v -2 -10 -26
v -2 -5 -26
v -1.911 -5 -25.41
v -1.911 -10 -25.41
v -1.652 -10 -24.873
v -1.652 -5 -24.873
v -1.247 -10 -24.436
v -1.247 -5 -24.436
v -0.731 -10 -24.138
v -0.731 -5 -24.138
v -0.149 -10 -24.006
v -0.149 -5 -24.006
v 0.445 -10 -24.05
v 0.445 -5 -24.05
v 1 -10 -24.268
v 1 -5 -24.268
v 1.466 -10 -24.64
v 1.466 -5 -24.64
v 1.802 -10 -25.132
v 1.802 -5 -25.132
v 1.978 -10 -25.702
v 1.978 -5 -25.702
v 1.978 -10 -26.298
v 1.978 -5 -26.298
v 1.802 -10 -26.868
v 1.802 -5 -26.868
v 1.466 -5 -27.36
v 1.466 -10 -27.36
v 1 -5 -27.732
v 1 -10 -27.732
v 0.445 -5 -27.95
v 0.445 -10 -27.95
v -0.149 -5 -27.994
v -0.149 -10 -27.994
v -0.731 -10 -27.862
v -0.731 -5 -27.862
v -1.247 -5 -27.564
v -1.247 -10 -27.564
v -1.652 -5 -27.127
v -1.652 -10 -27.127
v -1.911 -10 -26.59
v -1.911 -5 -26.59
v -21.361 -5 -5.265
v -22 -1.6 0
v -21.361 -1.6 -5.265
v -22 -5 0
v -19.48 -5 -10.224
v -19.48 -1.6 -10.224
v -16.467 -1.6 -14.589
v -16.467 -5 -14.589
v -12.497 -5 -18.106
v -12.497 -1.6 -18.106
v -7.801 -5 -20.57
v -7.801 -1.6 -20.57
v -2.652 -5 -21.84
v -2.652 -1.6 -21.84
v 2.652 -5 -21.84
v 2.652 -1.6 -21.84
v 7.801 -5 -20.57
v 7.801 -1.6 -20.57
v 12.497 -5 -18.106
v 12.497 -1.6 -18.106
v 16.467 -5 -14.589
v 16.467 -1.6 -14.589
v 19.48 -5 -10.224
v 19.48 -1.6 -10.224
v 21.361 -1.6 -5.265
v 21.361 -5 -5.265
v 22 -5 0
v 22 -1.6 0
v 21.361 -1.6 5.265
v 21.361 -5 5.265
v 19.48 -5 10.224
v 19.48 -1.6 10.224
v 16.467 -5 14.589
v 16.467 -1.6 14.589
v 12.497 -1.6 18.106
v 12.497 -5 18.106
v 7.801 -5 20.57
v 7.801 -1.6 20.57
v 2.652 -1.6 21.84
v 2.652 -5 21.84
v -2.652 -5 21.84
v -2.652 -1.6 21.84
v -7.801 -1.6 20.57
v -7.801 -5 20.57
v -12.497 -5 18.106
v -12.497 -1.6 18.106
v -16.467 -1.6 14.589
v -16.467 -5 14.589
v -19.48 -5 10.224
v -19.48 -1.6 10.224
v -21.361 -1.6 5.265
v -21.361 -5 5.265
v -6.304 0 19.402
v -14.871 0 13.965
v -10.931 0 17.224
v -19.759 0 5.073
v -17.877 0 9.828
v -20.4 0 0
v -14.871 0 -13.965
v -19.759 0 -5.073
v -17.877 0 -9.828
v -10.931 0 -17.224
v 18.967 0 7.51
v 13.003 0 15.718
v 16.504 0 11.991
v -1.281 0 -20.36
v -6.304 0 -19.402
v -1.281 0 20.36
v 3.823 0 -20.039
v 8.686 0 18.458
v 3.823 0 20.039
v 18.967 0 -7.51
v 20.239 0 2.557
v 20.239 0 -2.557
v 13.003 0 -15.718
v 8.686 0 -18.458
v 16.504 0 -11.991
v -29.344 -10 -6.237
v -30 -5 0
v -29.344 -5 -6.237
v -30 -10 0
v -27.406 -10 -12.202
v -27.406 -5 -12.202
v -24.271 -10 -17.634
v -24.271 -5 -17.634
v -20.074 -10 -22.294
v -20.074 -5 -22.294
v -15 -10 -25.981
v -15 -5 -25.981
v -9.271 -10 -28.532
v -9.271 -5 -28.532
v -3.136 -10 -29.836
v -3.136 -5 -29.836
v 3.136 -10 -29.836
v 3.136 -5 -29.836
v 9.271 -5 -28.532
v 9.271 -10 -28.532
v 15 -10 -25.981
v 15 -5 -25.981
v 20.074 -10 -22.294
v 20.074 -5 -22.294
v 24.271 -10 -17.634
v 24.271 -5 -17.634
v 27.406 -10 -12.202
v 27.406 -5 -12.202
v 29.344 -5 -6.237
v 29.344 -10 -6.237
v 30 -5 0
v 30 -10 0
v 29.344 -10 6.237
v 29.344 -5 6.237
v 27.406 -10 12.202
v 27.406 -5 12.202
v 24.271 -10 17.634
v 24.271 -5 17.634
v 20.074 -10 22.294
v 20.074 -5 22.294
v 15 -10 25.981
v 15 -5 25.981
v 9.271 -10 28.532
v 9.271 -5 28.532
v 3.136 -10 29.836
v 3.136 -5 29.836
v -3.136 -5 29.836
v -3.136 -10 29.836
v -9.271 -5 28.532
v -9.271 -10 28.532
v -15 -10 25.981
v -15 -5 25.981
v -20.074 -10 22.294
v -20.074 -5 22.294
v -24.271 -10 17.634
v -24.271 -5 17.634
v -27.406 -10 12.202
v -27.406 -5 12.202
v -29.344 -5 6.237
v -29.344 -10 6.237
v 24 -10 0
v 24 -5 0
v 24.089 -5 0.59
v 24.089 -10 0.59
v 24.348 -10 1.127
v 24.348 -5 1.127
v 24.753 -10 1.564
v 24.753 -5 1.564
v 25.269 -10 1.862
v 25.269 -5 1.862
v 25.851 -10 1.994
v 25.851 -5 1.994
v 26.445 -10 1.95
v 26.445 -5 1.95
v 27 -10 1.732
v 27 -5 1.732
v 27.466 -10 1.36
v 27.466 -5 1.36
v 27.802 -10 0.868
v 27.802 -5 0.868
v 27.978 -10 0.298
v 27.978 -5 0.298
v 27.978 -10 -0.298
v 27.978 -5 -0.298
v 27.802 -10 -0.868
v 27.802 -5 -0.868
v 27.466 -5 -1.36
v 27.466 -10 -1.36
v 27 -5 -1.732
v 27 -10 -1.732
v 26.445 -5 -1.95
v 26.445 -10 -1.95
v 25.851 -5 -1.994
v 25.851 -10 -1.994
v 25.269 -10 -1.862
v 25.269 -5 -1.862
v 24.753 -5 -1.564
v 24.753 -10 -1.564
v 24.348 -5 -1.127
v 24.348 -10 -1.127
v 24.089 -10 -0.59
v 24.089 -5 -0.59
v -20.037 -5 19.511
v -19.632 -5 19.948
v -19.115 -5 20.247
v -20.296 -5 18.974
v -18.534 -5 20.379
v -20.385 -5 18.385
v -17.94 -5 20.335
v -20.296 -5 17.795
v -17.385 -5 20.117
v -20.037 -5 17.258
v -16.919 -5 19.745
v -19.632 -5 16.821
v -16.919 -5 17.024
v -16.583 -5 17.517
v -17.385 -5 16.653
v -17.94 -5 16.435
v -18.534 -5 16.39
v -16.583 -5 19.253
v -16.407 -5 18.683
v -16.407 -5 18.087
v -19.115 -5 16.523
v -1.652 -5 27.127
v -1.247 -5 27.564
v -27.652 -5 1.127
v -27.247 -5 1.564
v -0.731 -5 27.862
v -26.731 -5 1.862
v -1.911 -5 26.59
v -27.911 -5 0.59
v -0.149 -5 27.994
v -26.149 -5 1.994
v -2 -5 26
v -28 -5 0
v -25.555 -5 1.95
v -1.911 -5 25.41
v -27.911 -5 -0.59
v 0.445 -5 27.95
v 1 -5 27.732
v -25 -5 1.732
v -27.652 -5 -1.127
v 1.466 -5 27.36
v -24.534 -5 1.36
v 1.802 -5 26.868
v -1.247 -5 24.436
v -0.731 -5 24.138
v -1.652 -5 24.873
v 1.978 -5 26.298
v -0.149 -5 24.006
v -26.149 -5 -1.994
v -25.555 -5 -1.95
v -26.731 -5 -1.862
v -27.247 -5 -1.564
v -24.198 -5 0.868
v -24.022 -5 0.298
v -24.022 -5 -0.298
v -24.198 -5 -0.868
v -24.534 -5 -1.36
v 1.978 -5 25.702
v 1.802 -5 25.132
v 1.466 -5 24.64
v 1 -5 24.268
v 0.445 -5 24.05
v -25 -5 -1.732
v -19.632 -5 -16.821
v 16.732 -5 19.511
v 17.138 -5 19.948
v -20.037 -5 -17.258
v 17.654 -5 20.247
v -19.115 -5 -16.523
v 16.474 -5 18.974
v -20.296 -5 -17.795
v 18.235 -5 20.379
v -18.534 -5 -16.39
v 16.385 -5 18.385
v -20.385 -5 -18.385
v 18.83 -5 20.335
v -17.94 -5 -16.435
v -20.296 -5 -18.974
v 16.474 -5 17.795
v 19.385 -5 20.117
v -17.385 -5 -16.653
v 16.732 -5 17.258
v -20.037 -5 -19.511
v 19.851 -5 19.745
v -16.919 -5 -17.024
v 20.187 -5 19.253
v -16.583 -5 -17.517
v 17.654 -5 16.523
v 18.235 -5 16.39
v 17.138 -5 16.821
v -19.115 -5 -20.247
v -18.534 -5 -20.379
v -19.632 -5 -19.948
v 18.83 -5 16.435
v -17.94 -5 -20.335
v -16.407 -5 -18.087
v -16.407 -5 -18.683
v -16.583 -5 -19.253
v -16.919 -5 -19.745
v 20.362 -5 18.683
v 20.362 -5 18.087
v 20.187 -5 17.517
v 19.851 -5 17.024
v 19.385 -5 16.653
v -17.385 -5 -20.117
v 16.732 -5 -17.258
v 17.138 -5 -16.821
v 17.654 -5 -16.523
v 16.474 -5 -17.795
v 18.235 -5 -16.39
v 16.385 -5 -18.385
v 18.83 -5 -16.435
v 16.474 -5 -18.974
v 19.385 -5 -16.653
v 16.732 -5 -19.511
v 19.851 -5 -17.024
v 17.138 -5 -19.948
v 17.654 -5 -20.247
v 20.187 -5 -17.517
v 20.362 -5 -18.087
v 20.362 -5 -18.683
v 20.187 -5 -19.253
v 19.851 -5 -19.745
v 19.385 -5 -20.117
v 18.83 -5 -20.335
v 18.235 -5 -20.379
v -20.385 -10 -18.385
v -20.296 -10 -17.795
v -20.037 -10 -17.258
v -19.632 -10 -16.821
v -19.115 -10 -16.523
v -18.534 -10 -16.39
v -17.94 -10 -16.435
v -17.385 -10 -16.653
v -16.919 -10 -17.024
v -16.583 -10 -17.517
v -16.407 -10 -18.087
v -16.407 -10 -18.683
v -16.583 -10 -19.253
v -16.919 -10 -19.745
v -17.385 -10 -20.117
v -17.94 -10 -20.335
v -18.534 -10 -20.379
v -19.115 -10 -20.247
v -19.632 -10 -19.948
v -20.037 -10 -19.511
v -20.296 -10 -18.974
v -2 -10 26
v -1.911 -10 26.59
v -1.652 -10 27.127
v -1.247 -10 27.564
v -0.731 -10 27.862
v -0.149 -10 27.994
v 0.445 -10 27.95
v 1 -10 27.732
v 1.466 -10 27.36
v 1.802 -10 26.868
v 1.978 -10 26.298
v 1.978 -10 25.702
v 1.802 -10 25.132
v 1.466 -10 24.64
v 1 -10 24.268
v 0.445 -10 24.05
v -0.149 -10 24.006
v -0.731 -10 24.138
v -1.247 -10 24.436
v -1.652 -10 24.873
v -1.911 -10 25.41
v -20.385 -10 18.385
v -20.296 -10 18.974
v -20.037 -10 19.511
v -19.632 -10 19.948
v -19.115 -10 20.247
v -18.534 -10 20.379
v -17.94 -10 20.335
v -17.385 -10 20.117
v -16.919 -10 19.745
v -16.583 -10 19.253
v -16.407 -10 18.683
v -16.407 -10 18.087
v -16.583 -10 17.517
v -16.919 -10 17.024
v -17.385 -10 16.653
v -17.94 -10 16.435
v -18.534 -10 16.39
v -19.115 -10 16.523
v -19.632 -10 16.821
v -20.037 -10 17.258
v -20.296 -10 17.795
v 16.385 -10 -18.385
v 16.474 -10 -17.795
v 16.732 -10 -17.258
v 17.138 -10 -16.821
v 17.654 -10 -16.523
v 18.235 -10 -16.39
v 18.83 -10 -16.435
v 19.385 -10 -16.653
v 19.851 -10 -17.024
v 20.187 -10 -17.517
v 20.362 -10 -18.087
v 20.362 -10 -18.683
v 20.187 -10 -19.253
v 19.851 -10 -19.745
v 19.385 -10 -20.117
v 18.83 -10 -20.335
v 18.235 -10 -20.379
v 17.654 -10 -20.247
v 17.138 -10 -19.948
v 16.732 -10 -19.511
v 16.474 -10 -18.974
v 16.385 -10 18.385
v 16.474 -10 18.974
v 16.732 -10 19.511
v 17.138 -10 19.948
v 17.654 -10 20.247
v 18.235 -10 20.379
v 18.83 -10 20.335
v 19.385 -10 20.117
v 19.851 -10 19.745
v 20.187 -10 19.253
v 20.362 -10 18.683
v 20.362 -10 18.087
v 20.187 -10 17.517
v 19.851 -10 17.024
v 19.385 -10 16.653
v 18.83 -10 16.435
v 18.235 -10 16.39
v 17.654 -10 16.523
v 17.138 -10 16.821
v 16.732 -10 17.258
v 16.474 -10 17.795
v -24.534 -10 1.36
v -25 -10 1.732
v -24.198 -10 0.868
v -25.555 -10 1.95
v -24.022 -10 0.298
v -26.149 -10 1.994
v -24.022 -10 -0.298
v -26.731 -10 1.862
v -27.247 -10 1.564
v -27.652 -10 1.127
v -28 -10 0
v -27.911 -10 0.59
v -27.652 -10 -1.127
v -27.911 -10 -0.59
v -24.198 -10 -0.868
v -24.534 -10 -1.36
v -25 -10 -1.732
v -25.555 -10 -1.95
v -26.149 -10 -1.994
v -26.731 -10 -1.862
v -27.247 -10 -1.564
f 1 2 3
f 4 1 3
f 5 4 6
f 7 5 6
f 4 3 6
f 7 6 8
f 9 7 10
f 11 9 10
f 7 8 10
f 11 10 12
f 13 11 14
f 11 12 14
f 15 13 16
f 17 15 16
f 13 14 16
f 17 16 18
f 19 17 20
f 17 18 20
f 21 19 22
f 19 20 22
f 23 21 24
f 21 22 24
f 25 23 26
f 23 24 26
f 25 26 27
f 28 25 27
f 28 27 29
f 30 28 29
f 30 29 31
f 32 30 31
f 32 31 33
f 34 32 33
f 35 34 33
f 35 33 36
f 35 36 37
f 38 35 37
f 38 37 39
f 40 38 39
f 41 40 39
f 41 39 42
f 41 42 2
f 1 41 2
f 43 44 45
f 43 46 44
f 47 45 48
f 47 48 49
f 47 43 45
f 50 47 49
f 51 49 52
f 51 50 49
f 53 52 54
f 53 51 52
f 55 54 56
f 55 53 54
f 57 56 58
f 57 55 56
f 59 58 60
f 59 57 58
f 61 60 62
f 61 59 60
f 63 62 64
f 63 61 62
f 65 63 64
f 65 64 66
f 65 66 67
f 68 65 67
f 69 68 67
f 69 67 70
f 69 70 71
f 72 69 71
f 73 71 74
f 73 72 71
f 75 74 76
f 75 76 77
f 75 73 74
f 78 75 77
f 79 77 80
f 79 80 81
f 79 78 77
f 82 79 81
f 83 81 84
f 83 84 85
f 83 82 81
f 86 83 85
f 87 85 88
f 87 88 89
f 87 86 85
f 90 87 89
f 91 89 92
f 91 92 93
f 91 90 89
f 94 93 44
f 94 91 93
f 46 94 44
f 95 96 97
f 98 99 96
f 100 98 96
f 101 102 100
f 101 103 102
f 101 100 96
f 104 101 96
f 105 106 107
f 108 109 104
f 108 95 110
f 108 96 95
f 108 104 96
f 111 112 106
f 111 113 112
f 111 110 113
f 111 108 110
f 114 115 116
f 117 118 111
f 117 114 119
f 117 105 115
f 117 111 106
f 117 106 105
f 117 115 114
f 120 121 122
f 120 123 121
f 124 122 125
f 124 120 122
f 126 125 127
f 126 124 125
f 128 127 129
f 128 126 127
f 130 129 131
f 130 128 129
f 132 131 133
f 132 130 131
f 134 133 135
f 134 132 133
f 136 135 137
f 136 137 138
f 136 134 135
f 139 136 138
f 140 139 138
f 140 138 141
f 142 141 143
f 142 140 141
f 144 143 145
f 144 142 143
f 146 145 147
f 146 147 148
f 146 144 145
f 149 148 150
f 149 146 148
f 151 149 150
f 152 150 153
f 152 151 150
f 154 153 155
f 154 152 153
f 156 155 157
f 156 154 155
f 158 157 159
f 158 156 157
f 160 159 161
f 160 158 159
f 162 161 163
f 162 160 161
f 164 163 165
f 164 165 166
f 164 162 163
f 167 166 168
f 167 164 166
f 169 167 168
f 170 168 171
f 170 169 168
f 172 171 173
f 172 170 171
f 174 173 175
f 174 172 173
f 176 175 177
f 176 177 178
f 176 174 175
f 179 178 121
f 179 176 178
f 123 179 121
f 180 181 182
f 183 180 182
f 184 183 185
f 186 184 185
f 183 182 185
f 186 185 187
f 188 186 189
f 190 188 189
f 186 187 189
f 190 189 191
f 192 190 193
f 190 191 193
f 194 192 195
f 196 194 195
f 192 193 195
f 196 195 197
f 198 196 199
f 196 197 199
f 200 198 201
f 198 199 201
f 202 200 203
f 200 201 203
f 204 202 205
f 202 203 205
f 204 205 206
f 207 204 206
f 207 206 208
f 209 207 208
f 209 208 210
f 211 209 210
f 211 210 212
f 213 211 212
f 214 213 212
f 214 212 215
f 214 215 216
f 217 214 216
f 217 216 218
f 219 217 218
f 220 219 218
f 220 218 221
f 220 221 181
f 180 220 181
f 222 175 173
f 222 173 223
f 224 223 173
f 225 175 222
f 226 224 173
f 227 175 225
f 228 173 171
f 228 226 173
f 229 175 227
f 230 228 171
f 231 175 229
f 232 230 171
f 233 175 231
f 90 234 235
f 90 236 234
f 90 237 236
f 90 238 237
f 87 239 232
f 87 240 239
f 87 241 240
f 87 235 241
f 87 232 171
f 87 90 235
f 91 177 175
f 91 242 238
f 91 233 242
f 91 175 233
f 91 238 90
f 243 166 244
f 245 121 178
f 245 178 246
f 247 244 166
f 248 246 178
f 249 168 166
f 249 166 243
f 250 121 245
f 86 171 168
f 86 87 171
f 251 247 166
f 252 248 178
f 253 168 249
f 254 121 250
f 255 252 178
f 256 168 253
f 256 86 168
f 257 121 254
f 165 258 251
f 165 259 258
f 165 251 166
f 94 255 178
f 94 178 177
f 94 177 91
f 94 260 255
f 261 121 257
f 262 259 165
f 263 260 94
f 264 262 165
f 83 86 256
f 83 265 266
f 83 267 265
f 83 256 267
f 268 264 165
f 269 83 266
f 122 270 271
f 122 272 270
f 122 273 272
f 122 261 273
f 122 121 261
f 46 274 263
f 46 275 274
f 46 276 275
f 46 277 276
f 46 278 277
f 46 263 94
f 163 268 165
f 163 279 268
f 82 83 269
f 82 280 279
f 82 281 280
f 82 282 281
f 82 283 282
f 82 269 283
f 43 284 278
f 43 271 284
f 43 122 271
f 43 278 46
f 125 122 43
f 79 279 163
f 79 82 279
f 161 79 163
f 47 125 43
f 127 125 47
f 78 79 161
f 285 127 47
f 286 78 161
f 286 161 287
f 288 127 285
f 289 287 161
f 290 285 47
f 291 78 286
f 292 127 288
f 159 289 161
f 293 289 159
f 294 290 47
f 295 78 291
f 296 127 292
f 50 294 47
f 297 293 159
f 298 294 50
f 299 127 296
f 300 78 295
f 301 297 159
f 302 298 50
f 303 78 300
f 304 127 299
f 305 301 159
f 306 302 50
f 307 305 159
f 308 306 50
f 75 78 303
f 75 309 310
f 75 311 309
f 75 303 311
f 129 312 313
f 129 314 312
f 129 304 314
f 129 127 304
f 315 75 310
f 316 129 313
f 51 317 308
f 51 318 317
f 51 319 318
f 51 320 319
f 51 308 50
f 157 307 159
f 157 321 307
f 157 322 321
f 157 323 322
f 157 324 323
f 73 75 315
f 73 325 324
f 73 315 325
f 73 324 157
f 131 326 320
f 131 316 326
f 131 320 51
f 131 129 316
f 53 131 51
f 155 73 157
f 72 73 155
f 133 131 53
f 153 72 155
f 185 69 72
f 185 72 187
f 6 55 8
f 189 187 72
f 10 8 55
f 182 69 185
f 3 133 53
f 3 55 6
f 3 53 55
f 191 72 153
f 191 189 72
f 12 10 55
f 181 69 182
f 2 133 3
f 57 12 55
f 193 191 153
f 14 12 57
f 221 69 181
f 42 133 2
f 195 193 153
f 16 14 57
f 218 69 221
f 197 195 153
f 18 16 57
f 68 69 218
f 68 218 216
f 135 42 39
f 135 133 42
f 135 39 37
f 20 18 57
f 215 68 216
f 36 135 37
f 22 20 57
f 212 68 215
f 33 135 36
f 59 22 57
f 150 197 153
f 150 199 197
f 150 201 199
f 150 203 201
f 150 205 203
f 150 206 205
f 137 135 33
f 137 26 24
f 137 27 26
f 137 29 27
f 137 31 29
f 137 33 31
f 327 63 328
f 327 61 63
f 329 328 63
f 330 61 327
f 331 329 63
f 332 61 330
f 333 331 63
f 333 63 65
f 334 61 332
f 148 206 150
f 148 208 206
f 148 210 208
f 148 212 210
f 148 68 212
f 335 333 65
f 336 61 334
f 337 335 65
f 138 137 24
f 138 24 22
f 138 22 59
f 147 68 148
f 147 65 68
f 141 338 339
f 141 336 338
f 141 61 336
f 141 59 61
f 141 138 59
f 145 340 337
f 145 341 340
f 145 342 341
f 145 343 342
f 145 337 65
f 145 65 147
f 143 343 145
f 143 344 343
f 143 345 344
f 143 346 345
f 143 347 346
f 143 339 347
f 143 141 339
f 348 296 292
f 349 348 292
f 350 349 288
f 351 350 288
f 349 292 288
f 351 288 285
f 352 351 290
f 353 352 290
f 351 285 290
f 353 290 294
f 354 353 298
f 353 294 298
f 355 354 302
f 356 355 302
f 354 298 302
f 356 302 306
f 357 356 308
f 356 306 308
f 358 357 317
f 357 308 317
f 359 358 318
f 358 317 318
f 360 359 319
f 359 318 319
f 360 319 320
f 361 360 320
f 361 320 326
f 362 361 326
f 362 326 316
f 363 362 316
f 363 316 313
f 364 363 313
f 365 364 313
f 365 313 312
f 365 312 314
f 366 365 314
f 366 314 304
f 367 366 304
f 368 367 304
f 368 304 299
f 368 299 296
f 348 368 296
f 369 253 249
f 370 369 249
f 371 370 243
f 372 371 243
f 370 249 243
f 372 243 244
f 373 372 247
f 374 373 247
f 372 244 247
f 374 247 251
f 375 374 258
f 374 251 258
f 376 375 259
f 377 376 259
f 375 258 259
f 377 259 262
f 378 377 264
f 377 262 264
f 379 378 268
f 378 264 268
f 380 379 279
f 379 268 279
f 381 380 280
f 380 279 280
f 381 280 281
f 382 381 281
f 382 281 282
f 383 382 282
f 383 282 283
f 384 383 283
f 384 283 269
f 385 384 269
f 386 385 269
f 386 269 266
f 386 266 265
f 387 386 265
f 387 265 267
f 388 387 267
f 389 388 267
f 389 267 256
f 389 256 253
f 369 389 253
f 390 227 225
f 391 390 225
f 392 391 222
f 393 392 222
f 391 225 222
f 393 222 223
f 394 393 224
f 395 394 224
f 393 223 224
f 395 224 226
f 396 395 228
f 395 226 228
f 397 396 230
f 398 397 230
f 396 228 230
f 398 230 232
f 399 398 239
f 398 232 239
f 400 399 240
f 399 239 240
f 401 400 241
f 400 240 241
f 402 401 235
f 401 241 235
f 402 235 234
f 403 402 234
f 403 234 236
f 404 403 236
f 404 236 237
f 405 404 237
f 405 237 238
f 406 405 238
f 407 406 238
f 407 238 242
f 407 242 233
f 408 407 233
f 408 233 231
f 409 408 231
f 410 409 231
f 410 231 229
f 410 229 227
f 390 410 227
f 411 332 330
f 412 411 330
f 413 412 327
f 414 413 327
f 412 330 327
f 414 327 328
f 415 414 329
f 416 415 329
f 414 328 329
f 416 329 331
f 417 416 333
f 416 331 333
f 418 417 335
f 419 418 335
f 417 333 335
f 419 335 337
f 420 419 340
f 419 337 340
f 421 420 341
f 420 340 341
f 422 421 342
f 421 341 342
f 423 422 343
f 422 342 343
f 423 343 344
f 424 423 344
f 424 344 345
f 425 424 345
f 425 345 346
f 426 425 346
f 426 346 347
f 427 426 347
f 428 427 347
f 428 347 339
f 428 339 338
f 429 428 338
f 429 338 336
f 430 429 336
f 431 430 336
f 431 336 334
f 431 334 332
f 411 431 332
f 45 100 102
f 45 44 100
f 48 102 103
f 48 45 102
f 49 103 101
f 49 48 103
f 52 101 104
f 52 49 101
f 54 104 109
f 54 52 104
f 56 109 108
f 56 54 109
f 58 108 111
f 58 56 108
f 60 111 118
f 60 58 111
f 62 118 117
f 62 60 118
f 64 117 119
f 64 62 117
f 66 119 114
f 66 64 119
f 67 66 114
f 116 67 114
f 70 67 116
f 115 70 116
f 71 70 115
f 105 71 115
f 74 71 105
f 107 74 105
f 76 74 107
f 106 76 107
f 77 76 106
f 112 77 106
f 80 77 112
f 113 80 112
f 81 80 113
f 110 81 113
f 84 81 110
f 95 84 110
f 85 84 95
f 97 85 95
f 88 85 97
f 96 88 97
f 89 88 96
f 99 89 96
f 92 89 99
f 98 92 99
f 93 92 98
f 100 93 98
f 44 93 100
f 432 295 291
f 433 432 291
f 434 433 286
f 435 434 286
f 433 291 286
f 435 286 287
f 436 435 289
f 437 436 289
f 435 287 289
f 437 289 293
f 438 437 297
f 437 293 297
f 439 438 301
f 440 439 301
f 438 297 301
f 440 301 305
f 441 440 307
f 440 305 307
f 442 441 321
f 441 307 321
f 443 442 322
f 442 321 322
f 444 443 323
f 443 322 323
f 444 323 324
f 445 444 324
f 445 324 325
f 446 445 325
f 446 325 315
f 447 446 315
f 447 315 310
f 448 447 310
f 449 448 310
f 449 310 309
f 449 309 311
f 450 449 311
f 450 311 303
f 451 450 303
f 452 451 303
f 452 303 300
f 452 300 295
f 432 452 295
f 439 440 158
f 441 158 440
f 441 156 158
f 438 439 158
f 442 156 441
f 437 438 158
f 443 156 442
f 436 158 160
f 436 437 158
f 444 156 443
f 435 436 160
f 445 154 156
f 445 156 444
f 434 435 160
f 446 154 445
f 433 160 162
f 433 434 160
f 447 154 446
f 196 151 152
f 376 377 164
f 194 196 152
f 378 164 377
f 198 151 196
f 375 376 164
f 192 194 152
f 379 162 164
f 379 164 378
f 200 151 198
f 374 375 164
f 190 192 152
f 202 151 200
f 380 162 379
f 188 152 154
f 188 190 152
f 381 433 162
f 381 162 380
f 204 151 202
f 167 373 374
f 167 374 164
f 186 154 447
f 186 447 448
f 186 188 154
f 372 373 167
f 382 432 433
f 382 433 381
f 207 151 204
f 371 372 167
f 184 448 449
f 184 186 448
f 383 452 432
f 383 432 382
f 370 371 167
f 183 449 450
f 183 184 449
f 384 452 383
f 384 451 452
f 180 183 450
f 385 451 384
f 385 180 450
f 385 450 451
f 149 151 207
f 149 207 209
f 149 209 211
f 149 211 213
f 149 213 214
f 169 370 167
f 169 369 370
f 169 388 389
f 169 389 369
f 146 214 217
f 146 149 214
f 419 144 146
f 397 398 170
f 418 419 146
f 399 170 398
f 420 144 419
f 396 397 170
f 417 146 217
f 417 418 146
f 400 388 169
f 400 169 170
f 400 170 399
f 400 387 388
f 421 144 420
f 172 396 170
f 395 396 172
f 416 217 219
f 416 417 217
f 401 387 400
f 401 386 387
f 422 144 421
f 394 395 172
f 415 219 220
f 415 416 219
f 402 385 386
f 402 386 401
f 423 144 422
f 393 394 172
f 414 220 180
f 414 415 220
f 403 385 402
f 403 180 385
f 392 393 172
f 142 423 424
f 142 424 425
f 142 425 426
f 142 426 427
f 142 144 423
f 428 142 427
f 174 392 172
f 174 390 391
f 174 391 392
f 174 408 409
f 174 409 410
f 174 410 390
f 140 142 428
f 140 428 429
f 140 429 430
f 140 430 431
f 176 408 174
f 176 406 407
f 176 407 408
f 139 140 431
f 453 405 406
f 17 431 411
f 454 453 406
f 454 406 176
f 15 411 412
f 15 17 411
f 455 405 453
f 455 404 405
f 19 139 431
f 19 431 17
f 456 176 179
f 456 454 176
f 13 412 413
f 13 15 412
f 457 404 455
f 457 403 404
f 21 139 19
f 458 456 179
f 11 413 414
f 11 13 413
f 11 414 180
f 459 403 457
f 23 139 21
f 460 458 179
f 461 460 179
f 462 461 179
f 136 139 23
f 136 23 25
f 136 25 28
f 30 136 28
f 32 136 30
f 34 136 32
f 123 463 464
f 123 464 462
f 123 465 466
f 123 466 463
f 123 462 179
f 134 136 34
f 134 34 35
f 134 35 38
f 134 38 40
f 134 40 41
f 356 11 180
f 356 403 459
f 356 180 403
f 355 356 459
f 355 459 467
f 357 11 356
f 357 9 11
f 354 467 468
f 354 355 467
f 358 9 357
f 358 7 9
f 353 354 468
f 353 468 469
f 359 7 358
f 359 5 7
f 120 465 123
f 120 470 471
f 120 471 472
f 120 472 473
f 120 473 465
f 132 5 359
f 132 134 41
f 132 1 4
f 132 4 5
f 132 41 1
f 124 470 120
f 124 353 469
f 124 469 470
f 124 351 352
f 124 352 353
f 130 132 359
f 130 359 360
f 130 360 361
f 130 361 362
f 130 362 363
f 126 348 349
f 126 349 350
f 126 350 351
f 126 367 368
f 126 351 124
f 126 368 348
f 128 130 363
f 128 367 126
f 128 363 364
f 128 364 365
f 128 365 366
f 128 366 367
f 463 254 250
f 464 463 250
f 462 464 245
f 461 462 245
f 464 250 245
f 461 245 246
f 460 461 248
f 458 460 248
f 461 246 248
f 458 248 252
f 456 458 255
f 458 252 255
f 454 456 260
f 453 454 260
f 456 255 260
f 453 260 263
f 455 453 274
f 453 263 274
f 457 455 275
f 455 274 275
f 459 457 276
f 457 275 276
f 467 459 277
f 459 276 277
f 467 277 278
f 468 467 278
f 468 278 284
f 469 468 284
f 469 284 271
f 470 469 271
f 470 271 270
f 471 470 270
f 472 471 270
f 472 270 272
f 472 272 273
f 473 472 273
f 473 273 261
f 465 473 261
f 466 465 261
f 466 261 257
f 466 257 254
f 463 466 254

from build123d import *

# Parameters (mm, degrees)
SKETCH_4_R          = 2
CUT_EXTRUDE_1_DEPTH = 20


with BuildPart() as part:
    # Эскиз1 → Повернуть11 (revolve)
    with BuildSketch(Plane.XY):
        Polygon((-30, -10), (0, -10), (0, 0), (-20.4, 0), (-22, -1.6), (-22, -5), (-30, -5), align=None)
    revolve(axis=Axis((0, 0, 0), (0, -1, 0)))

    # Эскиз4 → Вырез-Вытянуть1 (cut)
    with BuildSketch(Plane(origin=(0, -5, 0), x_dir=(1, 0, 0), z_dir=(0, 1, 0))):
        with Locations(Location((0, 26, 0), (0, 0, 180))):
            Circle(SKETCH_4_R)
        with Locations(Location((18.384776311, 18.384776311, 0), (0, 0, 180))):
            Circle(SKETCH_4_R)
        with Locations(Location((26, 0, 0), (0, 0, 180))):
            Circle(SKETCH_4_R)
        with Locations(Location((18.384776311, -18.384776311, 0), (0, 0, 180))):
            Circle(SKETCH_4_R)
        with Locations(Location((0, -26, 0), (0, 0, 180))):
            Circle(SKETCH_4_R)
        with Locations(Location((-18.384776311, -18.384776311, 0), (0, 0, 180))):
            Circle(SKETCH_4_R)
        with Locations(Location((-26, 0, 0), (0, 0, 180))):
            Circle(SKETCH_4_R)
        with Locations(Location((-18.384776311, 18.384776311, 0), (0, 0, 180))):
            Circle(SKETCH_4_R)
    extrude(amount=-CUT_EXTRUDE_1_DEPTH, mode=Mode.SUBTRACT)


solid = part.part
